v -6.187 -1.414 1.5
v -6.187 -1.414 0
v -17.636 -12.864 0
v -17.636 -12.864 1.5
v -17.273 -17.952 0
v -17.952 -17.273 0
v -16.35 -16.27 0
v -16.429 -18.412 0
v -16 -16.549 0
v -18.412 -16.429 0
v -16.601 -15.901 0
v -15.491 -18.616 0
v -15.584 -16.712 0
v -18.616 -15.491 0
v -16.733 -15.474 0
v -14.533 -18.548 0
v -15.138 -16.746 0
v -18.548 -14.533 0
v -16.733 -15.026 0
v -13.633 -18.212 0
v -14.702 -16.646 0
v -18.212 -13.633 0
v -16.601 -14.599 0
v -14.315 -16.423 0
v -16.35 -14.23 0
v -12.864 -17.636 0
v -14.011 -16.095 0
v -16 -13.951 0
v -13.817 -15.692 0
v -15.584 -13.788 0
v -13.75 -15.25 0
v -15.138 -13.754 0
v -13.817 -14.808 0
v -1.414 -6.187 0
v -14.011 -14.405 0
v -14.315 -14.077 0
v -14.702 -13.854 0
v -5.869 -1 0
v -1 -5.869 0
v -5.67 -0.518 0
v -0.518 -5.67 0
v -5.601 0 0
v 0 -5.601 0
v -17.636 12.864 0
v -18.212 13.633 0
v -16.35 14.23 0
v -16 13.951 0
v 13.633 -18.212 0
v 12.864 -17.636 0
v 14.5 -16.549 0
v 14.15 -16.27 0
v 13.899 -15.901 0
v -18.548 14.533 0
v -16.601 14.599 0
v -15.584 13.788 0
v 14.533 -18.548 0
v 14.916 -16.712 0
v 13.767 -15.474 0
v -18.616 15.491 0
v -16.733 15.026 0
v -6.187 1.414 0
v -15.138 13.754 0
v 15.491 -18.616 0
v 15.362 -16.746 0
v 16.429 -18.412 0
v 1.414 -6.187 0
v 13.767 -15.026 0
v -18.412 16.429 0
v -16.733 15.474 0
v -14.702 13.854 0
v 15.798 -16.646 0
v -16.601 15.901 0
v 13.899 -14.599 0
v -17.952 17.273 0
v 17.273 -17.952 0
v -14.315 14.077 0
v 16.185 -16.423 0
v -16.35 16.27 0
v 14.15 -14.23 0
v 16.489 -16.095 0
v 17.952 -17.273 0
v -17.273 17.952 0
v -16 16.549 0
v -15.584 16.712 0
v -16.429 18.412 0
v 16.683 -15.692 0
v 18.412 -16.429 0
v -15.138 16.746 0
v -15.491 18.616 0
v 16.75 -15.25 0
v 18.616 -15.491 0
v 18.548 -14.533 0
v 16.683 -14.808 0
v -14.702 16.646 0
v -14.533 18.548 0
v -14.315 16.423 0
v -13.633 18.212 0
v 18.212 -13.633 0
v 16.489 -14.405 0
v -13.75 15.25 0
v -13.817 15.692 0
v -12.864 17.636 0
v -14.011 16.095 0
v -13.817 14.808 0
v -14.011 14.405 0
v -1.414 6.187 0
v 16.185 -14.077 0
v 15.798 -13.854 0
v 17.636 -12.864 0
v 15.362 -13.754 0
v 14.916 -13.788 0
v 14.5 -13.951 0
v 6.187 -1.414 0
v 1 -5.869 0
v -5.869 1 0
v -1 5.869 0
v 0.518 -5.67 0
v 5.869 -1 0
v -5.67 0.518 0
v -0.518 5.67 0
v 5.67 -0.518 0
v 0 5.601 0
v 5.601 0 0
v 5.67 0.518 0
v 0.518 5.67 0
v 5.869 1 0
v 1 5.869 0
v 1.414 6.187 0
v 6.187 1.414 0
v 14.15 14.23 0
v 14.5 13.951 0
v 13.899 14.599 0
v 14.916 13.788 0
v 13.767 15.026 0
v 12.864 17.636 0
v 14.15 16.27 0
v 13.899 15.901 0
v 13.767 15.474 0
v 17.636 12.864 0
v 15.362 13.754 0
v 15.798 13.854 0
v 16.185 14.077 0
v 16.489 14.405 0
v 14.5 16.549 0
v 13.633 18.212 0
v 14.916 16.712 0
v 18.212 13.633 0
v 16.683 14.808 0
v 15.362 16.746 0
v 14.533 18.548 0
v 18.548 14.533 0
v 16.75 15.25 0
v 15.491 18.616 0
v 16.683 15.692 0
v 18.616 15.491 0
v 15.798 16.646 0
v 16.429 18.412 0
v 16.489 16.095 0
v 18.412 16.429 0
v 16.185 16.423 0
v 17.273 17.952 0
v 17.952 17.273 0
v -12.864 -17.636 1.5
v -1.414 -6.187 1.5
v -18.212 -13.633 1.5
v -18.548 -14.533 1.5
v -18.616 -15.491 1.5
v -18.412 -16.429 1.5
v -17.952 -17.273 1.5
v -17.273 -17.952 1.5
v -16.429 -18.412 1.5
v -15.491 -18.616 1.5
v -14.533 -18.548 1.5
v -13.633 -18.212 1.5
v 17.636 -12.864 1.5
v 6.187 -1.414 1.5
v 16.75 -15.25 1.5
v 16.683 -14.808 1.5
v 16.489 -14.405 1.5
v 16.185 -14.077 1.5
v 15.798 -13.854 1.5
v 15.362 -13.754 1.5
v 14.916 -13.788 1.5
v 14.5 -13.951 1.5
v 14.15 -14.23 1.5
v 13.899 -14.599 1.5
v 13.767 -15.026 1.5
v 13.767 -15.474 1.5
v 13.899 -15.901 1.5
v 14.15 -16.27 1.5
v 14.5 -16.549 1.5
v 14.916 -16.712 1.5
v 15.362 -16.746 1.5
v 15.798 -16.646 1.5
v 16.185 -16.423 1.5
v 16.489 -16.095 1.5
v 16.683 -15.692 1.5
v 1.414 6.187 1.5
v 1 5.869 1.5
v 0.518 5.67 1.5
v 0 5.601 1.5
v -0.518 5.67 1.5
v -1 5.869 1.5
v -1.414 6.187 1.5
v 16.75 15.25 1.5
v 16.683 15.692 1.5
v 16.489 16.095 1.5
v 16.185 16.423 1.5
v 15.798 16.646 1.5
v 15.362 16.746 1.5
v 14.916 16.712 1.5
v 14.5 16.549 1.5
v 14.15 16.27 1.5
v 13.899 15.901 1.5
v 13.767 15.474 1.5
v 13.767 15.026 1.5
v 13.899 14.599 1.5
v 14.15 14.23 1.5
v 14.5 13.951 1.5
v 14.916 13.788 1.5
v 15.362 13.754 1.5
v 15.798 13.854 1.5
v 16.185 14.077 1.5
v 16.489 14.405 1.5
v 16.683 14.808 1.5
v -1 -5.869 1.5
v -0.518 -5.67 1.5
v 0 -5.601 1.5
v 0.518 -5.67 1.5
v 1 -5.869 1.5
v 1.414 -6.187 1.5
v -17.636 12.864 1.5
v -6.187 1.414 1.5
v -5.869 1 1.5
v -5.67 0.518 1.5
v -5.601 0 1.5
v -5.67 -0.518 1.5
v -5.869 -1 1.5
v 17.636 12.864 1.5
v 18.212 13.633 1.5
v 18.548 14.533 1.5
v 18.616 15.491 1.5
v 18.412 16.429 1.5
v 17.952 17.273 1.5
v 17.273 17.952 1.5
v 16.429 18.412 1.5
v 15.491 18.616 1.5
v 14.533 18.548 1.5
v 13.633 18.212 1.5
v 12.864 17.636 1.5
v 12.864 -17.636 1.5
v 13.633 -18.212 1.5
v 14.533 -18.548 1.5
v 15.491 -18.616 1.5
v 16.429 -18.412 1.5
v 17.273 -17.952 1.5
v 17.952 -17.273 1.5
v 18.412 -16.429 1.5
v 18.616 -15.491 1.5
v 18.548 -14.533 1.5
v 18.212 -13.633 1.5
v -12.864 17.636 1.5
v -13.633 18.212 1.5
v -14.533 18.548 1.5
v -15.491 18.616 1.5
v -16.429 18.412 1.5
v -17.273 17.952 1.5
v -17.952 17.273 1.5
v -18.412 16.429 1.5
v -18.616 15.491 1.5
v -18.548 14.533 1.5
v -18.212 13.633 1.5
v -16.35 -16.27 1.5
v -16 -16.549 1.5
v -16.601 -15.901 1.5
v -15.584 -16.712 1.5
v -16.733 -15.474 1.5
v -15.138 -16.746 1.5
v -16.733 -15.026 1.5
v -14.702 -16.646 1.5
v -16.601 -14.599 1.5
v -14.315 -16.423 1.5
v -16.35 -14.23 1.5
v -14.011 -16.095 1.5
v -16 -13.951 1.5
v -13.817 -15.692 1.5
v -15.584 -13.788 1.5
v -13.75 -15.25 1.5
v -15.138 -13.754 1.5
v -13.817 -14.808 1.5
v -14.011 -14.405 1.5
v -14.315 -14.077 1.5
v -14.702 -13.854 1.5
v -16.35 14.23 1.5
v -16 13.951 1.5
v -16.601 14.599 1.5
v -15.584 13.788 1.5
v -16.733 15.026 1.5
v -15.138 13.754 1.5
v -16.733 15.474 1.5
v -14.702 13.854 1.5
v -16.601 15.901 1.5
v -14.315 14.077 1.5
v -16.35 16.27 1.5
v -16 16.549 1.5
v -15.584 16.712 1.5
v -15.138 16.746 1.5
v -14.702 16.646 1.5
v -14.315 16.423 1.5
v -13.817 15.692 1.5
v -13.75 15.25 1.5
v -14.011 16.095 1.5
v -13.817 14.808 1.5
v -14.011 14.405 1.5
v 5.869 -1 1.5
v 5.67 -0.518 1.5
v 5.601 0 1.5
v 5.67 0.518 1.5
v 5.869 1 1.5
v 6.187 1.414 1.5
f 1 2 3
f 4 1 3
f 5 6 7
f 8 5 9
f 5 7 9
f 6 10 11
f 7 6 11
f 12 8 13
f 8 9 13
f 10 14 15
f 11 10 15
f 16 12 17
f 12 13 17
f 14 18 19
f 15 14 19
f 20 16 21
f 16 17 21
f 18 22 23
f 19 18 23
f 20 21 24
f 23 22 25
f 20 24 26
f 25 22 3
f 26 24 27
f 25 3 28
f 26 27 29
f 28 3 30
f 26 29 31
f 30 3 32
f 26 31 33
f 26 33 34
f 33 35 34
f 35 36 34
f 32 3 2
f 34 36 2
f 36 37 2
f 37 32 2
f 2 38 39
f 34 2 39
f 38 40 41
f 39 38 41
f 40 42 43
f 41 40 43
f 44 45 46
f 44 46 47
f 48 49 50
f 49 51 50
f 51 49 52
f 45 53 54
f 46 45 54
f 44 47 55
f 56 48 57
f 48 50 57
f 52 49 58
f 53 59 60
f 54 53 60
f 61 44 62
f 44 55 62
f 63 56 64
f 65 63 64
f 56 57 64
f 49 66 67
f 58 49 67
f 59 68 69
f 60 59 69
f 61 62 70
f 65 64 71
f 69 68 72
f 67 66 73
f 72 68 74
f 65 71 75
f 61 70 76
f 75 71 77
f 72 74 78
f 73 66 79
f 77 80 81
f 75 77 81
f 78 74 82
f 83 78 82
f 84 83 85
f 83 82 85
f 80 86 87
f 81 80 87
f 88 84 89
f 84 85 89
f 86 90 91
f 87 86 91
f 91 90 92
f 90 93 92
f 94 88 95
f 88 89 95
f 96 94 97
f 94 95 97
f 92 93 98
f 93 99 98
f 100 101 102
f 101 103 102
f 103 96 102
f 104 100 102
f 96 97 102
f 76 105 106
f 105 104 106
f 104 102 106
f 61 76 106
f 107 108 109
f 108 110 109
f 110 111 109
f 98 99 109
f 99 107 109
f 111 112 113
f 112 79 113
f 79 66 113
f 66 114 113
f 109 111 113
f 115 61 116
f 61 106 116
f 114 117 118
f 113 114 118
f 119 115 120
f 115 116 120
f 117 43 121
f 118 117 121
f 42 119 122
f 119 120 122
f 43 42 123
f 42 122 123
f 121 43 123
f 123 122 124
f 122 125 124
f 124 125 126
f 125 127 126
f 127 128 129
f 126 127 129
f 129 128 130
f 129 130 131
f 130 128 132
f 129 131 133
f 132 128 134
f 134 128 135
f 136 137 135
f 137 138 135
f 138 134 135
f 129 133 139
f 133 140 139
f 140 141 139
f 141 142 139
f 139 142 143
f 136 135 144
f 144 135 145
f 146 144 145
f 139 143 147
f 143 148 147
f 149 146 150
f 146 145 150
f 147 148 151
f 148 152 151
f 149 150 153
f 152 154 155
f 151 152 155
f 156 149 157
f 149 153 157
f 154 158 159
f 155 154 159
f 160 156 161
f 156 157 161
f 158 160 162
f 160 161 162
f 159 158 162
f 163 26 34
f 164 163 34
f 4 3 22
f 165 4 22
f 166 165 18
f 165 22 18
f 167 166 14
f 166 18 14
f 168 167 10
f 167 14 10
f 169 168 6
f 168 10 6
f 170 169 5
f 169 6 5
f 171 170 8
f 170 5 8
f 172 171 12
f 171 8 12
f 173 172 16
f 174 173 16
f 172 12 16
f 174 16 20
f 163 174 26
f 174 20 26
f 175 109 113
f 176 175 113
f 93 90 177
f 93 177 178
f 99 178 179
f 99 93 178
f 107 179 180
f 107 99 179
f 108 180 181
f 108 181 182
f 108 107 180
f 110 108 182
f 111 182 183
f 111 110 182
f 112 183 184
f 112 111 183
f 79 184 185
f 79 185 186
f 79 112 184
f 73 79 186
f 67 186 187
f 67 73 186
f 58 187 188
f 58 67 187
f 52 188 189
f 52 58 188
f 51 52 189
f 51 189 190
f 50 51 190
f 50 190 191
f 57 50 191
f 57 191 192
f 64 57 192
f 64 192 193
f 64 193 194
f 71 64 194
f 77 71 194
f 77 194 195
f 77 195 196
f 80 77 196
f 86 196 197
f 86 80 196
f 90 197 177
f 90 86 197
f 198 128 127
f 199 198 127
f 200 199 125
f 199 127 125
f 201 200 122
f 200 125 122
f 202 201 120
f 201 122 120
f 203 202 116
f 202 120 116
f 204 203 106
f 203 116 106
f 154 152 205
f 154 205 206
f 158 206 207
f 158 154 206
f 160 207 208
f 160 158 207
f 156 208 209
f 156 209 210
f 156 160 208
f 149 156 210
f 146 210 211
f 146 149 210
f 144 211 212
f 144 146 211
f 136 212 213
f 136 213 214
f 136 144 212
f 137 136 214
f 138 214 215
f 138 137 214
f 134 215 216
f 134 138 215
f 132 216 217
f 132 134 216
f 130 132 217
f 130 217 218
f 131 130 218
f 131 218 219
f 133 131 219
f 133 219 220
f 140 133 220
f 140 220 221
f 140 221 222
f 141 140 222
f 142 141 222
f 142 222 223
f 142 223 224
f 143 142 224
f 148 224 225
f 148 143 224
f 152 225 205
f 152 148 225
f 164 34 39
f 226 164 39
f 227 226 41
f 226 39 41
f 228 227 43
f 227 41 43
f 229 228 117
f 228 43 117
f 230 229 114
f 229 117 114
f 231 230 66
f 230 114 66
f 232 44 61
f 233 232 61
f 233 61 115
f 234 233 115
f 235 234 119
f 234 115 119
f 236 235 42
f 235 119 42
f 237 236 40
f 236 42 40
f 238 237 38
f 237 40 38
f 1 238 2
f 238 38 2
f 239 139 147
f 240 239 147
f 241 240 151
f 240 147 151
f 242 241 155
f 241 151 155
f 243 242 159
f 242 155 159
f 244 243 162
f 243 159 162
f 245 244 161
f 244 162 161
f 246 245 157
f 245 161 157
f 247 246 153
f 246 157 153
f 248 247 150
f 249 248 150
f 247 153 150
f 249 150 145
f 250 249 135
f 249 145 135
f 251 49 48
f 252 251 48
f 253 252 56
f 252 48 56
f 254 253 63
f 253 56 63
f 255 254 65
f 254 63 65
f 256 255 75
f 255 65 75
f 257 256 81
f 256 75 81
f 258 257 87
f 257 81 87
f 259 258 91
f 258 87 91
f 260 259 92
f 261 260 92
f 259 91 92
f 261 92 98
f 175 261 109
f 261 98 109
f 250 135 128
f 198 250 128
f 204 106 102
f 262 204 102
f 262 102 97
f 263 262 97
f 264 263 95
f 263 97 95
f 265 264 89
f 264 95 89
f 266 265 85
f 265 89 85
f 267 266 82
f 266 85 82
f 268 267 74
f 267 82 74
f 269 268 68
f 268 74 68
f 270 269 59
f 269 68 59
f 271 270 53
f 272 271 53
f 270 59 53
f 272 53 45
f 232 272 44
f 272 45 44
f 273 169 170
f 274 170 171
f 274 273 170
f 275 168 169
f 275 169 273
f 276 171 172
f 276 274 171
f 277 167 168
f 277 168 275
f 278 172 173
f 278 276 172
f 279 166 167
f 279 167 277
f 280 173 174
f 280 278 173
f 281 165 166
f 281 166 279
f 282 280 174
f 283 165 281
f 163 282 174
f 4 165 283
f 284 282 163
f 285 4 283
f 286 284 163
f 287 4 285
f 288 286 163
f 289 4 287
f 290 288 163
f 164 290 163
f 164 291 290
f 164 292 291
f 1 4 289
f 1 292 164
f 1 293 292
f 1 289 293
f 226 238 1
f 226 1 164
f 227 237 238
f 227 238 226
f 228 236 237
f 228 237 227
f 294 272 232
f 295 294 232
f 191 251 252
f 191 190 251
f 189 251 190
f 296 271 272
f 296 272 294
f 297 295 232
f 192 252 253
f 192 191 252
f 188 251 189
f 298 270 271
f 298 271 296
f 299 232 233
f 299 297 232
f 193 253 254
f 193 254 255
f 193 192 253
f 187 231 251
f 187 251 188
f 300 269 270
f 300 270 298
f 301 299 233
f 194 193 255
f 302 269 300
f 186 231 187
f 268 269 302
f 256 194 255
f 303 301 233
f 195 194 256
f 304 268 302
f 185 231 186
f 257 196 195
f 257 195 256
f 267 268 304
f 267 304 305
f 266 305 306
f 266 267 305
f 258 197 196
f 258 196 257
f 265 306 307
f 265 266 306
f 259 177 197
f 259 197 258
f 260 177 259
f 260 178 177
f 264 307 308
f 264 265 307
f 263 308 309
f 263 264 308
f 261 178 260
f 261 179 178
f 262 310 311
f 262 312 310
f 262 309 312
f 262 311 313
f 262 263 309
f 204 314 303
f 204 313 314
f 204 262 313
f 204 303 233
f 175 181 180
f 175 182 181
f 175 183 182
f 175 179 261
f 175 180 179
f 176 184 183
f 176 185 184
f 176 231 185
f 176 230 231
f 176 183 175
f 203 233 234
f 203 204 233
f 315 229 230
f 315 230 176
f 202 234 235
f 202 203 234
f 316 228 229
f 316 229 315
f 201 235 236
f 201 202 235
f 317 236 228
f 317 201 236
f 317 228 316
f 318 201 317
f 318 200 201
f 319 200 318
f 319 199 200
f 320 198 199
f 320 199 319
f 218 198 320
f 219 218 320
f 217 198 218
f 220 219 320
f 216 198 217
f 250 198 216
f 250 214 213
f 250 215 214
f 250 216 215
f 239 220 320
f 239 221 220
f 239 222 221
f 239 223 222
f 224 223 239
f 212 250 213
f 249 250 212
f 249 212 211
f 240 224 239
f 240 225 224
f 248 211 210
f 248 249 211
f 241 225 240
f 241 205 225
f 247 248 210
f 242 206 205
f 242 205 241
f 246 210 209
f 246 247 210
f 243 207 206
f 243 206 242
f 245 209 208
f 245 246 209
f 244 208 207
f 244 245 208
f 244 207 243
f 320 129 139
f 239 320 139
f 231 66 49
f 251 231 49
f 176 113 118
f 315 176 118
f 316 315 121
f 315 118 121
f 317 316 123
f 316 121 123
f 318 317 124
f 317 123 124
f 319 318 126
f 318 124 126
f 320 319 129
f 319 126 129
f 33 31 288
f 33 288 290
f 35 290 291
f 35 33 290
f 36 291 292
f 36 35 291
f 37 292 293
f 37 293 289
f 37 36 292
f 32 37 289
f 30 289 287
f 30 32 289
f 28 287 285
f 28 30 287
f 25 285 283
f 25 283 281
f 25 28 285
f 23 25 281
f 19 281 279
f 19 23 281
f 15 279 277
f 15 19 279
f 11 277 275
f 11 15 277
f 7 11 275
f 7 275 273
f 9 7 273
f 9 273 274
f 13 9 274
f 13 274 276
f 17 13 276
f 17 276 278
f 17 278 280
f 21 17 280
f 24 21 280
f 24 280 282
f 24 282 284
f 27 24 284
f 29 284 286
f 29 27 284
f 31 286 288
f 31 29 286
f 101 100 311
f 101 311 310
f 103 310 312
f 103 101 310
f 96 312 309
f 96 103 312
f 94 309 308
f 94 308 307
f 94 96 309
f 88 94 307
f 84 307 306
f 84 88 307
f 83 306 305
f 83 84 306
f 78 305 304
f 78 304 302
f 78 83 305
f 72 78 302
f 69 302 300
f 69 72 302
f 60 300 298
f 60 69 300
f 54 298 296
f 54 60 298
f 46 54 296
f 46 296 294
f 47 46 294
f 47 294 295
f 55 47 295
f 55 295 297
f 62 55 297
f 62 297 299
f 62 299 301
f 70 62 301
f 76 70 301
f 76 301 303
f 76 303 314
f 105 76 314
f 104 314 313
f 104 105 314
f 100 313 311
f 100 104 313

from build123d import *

# Parameters (mm, degrees)
F0_R     = 1.5
F1_DEPTH = 1.5


with BuildPart() as f1:
    # F0 (on Top) → F1 (new body)
    with BuildSketch(Plane.XY):
        with BuildLine():
            ThreePointArc((-12.863515, 17.636485), (-17.636485, 17.636485), (-17.636485, 12.863515))
            Line((-17.636485, 12.863515), (-6.187184, 1.414214))
            ThreePointArc((-6.187184, 1.414214), (-5.601398, 0), (-6.187184, -1.414214))
            Line((-6.187184, -1.414214), (-17.636485, -12.863515))
            ThreePointArc((-17.636485, -12.863515), (-17.636485, -17.636485), (-12.863515, -17.636485))
            Line((-12.863515, -17.636485), (-1.414214, -6.187184))
            ThreePointArc((-1.414214, -6.187184), (0, -5.601398), (1.414214, -6.187184))
            Line((1.414214, -6.187184), (12.863515, -17.636485))
            ThreePointArc((12.863515, -17.636485), (17.636485, -17.636485), (17.636485, -12.863515))
            Line((17.636485, -12.863515), (6.187184, -1.414214))
            ThreePointArc((6.187184, -1.414214), (5.601398, 0), (6.187184, 1.414214))
            Line((6.187184, 1.414214), (17.636485, 12.863515))
            ThreePointArc((17.636485, 12.863515), (17.636485, 17.636485), (12.863515, 17.636485))
            Line((12.863515, 17.636485), (1.414214, 6.187184))
            ThreePointArc((1.414214, 6.187184), (0, 5.601398), (-1.414214, 6.187184))
            Line((-1.414214, 6.187184), (-12.863515, 17.636485))
        make_face()
        with Locations((-15.25, -15.25)):
            Circle(F0_R, mode=Mode.SUBTRACT)
        with Locations((15.25, -15.25)):
            Circle(F0_R, mode=Mode.SUBTRACT)
        with Locations((-15.25, 15.25)):
            Circle(F0_R, mode=Mode.SUBTRACT)
        with Locations((15.25, 15.25)):
            Circle(F0_R, mode=Mode.SUBTRACT)
    extrude(amount=F1_DEPTH)


solid = f1.part
